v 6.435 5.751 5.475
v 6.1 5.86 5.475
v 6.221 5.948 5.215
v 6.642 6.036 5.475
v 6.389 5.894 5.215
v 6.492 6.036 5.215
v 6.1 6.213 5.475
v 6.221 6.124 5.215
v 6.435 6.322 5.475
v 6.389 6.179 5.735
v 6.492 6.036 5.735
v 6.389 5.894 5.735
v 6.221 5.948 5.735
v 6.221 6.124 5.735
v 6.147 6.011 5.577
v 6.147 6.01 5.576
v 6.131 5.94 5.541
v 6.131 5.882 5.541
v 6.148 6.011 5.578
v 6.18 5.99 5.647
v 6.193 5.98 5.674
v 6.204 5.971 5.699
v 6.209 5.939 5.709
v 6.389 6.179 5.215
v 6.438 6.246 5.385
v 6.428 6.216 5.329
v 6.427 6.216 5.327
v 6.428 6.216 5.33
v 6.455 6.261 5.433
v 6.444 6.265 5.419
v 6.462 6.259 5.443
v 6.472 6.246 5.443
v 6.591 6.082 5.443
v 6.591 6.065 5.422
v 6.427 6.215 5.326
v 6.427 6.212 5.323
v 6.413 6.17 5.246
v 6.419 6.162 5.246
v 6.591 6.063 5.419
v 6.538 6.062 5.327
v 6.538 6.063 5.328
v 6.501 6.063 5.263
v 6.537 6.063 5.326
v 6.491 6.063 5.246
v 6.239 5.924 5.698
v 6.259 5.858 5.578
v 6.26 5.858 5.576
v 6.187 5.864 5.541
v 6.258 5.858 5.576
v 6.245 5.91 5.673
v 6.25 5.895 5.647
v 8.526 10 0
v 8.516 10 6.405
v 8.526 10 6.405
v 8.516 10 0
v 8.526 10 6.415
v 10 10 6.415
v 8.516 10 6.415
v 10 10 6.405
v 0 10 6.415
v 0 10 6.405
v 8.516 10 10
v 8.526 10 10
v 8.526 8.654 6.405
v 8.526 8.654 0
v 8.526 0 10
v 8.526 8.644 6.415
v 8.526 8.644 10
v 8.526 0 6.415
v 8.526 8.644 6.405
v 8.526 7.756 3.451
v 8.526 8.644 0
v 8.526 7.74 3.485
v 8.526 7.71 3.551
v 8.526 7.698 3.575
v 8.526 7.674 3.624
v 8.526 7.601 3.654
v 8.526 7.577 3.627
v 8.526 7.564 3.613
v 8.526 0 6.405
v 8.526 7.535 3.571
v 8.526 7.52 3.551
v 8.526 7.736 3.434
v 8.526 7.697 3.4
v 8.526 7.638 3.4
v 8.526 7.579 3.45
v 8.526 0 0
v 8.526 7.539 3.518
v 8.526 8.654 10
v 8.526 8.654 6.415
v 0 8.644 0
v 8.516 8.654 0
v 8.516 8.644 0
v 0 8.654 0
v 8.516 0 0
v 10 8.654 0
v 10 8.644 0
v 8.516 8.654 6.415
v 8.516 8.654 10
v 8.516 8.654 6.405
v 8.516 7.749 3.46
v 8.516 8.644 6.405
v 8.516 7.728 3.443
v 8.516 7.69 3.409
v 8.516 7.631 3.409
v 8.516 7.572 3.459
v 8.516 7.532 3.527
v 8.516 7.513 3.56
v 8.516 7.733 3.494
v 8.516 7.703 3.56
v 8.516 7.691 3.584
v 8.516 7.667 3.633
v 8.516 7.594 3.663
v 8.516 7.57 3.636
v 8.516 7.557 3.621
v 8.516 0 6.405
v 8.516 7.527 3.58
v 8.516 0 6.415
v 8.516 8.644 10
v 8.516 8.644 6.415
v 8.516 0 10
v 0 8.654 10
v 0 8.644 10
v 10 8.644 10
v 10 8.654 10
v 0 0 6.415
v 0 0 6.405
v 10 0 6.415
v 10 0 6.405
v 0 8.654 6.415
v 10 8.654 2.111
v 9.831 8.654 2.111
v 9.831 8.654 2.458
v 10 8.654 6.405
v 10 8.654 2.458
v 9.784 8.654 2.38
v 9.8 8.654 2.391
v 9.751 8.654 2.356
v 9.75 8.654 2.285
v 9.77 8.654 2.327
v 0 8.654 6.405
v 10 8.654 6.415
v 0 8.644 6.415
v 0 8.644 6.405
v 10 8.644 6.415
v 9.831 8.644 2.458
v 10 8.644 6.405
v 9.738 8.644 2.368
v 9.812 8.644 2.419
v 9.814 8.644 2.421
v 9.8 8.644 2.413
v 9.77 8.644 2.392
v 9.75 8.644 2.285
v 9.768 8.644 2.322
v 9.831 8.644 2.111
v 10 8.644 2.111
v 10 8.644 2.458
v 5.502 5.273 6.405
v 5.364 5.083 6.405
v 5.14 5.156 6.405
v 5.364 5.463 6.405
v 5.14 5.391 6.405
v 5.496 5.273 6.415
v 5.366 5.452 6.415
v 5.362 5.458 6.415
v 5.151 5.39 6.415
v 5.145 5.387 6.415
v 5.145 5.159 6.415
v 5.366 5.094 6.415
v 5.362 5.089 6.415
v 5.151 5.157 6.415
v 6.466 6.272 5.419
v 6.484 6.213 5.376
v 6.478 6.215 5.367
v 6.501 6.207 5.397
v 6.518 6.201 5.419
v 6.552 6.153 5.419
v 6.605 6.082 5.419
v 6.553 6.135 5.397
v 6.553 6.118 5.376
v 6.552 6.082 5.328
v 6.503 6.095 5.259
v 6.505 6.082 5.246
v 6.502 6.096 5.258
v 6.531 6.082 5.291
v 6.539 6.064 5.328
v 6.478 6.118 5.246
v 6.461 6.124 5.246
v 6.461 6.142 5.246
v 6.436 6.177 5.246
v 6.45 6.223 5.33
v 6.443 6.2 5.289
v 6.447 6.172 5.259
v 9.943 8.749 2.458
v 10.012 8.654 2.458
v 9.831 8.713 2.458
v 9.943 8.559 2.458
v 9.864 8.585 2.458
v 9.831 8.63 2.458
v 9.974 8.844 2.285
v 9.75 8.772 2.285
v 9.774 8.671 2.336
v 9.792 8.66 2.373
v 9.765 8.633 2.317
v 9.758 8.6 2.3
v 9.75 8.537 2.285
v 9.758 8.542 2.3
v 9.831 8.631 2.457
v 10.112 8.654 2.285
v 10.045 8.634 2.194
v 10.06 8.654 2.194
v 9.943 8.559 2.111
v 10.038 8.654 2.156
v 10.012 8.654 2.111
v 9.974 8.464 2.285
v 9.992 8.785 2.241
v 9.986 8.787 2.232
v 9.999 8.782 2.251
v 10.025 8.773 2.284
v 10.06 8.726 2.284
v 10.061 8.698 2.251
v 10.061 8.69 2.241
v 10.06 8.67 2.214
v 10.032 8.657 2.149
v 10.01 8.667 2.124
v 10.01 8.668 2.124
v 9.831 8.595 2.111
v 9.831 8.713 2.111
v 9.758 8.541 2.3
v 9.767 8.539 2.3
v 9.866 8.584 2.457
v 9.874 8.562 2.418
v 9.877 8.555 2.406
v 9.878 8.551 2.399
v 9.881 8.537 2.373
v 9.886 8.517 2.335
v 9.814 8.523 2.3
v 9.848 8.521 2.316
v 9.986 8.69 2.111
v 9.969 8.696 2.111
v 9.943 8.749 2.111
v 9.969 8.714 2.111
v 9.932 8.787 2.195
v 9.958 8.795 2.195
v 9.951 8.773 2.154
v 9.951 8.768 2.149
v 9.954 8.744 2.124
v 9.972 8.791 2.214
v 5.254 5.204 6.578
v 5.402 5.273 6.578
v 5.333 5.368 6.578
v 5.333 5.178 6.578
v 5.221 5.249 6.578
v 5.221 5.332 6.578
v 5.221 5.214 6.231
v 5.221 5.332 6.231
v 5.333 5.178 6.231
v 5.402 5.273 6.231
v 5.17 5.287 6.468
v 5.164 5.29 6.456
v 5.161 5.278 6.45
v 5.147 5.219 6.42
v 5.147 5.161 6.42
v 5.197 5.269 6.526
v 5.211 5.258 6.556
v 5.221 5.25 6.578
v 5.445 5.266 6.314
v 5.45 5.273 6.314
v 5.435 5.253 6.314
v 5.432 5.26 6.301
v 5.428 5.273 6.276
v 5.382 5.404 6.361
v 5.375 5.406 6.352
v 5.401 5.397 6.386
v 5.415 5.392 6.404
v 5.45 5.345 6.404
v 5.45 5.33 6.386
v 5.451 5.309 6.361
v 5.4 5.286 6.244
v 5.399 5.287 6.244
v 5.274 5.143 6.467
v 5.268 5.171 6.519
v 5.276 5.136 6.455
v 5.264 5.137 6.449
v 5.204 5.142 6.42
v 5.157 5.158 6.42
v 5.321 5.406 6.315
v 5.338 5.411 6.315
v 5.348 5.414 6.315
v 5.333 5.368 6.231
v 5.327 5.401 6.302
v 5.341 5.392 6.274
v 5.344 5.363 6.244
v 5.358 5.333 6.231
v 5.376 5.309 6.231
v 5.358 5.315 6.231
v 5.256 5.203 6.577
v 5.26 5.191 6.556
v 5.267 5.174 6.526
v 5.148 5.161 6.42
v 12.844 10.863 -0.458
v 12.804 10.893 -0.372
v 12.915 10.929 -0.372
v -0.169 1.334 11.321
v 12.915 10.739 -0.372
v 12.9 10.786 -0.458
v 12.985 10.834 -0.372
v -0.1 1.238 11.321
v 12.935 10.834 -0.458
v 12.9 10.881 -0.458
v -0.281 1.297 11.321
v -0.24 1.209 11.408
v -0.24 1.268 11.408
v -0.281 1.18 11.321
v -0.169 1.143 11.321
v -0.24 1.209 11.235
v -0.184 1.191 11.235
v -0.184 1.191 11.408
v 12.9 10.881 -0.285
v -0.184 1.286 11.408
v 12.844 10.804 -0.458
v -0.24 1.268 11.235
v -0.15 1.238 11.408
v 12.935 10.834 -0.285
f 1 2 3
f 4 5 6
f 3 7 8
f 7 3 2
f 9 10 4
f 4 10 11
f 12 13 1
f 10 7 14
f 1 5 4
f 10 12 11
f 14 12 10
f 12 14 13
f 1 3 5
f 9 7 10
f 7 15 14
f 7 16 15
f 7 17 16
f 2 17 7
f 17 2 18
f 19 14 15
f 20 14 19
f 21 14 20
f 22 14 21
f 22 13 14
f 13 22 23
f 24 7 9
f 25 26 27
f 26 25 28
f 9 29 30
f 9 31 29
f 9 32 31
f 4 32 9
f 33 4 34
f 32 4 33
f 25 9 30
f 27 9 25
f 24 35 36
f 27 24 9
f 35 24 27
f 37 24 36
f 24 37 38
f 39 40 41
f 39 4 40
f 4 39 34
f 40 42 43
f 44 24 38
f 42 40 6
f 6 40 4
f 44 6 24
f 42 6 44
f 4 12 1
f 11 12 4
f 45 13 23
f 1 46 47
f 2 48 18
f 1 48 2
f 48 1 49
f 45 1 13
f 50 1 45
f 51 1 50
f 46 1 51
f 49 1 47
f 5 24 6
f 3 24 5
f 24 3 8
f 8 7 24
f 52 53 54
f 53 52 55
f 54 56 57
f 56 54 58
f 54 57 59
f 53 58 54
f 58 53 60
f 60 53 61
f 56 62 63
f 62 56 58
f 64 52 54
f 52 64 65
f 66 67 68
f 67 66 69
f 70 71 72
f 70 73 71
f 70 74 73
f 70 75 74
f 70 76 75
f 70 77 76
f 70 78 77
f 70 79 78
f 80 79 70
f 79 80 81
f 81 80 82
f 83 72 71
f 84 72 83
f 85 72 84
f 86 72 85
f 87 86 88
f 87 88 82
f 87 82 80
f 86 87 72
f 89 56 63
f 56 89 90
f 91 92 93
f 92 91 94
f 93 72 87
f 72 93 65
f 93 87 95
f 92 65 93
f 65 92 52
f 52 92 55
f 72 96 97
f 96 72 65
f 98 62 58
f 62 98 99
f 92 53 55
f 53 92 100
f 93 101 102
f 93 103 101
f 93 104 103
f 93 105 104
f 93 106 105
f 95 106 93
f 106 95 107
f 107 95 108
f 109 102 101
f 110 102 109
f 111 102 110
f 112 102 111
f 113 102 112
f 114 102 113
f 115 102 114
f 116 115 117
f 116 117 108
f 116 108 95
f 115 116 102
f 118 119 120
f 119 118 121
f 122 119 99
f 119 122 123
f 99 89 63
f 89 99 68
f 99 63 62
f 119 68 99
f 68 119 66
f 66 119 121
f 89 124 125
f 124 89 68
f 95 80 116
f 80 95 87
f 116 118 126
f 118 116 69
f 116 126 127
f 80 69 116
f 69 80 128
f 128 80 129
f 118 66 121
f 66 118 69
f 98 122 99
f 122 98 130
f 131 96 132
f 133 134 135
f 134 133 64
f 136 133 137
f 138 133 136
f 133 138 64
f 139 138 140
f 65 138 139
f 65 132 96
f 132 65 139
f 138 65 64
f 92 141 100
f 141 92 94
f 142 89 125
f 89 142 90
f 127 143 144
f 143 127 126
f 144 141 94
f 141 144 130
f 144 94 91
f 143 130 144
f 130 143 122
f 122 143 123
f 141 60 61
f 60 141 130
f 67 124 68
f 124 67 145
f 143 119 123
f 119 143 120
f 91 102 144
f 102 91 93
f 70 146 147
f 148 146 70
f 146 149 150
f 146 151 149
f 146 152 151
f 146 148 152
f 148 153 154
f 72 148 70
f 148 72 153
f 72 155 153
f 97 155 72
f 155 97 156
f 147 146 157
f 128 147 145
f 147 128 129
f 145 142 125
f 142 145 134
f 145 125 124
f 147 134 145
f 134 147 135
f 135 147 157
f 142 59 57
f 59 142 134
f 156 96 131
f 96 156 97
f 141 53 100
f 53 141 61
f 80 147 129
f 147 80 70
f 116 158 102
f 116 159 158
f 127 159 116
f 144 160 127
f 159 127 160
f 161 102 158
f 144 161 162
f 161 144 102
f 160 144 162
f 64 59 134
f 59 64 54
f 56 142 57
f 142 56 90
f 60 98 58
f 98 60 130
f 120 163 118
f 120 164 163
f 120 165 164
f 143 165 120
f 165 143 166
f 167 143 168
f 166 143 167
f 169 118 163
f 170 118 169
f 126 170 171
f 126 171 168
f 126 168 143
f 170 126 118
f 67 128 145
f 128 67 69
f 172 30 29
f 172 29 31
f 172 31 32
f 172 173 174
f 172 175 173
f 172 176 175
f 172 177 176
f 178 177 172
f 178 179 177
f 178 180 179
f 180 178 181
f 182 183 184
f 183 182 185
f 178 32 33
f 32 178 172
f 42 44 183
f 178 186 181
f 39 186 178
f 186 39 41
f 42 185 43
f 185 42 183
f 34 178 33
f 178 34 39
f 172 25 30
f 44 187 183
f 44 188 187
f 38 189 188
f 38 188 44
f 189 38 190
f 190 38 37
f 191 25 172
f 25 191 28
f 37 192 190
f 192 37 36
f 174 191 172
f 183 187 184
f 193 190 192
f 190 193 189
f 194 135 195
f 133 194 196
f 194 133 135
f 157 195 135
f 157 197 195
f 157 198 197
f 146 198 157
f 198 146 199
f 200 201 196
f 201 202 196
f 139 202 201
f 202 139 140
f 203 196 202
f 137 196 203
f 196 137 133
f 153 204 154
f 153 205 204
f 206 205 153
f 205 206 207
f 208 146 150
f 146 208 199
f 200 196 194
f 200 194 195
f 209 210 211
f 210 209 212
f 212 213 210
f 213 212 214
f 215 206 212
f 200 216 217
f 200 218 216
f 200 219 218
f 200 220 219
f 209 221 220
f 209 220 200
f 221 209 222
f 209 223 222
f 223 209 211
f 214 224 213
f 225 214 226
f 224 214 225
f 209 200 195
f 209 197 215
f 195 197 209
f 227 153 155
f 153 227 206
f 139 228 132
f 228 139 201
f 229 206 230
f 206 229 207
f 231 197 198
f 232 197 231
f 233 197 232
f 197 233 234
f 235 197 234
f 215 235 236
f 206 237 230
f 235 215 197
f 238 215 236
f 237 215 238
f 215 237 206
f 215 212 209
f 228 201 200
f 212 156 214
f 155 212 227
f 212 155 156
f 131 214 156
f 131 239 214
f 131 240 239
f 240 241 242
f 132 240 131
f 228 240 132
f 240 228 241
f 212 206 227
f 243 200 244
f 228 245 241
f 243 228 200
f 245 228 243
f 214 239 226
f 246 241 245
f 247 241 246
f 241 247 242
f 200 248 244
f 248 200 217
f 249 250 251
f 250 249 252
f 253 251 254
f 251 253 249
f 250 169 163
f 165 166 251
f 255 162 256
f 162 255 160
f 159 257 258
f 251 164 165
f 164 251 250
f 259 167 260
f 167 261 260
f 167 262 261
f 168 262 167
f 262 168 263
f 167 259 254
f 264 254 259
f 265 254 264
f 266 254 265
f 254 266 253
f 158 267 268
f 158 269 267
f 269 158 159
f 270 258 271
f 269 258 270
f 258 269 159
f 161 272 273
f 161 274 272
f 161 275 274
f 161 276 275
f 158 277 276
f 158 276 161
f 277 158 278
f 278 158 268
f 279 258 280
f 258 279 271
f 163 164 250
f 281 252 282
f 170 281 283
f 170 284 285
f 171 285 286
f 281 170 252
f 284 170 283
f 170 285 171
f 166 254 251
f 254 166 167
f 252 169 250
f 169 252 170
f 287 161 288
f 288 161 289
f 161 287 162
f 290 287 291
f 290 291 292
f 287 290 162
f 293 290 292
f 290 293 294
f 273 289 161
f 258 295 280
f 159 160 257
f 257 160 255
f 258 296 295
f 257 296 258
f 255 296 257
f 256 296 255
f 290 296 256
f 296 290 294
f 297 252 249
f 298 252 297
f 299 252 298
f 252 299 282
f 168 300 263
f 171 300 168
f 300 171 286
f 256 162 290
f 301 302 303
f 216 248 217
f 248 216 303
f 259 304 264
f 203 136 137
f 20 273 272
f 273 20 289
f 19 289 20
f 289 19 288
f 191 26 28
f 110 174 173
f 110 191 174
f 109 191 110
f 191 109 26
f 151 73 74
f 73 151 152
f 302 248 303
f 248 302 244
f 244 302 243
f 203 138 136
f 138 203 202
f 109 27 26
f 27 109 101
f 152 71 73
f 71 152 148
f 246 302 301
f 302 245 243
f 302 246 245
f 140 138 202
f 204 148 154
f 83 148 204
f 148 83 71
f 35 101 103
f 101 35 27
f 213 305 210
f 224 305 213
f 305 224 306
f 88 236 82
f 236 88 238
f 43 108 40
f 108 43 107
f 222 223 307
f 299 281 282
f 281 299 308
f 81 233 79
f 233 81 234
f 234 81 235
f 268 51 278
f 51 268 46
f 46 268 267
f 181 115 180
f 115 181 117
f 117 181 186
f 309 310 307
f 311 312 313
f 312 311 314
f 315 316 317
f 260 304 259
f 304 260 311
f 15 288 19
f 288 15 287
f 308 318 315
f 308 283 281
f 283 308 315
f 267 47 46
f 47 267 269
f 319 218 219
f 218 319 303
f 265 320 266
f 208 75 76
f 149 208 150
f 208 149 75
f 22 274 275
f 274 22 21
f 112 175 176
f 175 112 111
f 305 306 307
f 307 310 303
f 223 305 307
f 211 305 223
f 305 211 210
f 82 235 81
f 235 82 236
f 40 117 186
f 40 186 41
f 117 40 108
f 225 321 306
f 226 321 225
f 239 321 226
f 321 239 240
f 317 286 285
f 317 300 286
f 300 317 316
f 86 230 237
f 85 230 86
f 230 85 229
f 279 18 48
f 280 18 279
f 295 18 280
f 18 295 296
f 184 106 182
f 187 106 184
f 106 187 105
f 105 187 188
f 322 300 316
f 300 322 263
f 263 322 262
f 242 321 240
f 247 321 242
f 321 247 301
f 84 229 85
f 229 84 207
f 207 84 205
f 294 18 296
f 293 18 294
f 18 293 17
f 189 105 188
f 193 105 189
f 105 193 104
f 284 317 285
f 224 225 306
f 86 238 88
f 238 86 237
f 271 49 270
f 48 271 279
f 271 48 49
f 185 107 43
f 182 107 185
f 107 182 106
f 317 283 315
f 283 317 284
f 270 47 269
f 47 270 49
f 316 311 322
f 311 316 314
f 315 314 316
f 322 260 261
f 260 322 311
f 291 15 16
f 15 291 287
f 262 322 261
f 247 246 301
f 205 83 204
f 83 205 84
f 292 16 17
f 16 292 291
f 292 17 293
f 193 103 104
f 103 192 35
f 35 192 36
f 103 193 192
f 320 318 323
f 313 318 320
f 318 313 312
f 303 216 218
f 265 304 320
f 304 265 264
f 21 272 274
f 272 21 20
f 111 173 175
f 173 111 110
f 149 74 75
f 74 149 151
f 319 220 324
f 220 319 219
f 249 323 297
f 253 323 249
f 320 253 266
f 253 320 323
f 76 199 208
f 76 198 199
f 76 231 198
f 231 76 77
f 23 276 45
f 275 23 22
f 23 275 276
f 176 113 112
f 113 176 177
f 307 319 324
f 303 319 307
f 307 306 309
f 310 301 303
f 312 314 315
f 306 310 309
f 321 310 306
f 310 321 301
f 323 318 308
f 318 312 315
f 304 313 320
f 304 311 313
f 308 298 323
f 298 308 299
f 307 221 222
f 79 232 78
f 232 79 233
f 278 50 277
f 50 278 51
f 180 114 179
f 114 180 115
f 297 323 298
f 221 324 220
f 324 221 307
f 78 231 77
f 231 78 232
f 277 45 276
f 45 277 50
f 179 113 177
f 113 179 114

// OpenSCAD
line=[rands(0,10,3),un(rands(-1,1,3))];
translate(line[0])color("blue") sphere(0.3);
planex=rands(0,10,1)[0];
planey=rands(0,10,1)[0];
planez=rands(0,10,1)[0];

#translate([planex,0,0]) rotate([0,-90,0])linear_extrude(0.01)square(10 );
#translate([0,planey,0]) rotate([90,0,0])linear_extrude(0.01)square(10);
#translate([0,0,planez]) rotate([0,0,0])linear_extrude(0.01)square(10);

function intersectXPlane(planex,line=[[0,0,0],[1,0,0]])=[planex,line[0].y,line[0].z]+((planex-line[0].x))*[0,line[1].y,line[1].z]/line[1].x;


function intersectYPlane(planey,line=[[0,0,0],[0,1,0]])=[line[0].x,planey,line[0].z]+((planey-line[0].y))*[line[1].x,0,line[1].z]/line[1].y;


function intersectZPlane(planez,line=[[0,0,0],[0,0,1]])=[line[0].x,line[0].y,planez]+((planez-line[0].z))*[ line[1].x,line[1].y,0]/line[1].z;



 
translate(intersectXPlane(planez,line )) sphere(0.2);
translate(intersectYPlane(planey,line )) sphere(0.2);
translate(intersectZPlane(planez,line )) sphere(0.2);


function un(v) = v / max(norm(v), 0.000001) * 1; // div by zero safe unit normal
translate(line[0])
hull(){
    sphere(0.1);
    translate(line[1]*10)sphere(0.1); 
    translate(-line[1]*10)sphere(0.1); }
